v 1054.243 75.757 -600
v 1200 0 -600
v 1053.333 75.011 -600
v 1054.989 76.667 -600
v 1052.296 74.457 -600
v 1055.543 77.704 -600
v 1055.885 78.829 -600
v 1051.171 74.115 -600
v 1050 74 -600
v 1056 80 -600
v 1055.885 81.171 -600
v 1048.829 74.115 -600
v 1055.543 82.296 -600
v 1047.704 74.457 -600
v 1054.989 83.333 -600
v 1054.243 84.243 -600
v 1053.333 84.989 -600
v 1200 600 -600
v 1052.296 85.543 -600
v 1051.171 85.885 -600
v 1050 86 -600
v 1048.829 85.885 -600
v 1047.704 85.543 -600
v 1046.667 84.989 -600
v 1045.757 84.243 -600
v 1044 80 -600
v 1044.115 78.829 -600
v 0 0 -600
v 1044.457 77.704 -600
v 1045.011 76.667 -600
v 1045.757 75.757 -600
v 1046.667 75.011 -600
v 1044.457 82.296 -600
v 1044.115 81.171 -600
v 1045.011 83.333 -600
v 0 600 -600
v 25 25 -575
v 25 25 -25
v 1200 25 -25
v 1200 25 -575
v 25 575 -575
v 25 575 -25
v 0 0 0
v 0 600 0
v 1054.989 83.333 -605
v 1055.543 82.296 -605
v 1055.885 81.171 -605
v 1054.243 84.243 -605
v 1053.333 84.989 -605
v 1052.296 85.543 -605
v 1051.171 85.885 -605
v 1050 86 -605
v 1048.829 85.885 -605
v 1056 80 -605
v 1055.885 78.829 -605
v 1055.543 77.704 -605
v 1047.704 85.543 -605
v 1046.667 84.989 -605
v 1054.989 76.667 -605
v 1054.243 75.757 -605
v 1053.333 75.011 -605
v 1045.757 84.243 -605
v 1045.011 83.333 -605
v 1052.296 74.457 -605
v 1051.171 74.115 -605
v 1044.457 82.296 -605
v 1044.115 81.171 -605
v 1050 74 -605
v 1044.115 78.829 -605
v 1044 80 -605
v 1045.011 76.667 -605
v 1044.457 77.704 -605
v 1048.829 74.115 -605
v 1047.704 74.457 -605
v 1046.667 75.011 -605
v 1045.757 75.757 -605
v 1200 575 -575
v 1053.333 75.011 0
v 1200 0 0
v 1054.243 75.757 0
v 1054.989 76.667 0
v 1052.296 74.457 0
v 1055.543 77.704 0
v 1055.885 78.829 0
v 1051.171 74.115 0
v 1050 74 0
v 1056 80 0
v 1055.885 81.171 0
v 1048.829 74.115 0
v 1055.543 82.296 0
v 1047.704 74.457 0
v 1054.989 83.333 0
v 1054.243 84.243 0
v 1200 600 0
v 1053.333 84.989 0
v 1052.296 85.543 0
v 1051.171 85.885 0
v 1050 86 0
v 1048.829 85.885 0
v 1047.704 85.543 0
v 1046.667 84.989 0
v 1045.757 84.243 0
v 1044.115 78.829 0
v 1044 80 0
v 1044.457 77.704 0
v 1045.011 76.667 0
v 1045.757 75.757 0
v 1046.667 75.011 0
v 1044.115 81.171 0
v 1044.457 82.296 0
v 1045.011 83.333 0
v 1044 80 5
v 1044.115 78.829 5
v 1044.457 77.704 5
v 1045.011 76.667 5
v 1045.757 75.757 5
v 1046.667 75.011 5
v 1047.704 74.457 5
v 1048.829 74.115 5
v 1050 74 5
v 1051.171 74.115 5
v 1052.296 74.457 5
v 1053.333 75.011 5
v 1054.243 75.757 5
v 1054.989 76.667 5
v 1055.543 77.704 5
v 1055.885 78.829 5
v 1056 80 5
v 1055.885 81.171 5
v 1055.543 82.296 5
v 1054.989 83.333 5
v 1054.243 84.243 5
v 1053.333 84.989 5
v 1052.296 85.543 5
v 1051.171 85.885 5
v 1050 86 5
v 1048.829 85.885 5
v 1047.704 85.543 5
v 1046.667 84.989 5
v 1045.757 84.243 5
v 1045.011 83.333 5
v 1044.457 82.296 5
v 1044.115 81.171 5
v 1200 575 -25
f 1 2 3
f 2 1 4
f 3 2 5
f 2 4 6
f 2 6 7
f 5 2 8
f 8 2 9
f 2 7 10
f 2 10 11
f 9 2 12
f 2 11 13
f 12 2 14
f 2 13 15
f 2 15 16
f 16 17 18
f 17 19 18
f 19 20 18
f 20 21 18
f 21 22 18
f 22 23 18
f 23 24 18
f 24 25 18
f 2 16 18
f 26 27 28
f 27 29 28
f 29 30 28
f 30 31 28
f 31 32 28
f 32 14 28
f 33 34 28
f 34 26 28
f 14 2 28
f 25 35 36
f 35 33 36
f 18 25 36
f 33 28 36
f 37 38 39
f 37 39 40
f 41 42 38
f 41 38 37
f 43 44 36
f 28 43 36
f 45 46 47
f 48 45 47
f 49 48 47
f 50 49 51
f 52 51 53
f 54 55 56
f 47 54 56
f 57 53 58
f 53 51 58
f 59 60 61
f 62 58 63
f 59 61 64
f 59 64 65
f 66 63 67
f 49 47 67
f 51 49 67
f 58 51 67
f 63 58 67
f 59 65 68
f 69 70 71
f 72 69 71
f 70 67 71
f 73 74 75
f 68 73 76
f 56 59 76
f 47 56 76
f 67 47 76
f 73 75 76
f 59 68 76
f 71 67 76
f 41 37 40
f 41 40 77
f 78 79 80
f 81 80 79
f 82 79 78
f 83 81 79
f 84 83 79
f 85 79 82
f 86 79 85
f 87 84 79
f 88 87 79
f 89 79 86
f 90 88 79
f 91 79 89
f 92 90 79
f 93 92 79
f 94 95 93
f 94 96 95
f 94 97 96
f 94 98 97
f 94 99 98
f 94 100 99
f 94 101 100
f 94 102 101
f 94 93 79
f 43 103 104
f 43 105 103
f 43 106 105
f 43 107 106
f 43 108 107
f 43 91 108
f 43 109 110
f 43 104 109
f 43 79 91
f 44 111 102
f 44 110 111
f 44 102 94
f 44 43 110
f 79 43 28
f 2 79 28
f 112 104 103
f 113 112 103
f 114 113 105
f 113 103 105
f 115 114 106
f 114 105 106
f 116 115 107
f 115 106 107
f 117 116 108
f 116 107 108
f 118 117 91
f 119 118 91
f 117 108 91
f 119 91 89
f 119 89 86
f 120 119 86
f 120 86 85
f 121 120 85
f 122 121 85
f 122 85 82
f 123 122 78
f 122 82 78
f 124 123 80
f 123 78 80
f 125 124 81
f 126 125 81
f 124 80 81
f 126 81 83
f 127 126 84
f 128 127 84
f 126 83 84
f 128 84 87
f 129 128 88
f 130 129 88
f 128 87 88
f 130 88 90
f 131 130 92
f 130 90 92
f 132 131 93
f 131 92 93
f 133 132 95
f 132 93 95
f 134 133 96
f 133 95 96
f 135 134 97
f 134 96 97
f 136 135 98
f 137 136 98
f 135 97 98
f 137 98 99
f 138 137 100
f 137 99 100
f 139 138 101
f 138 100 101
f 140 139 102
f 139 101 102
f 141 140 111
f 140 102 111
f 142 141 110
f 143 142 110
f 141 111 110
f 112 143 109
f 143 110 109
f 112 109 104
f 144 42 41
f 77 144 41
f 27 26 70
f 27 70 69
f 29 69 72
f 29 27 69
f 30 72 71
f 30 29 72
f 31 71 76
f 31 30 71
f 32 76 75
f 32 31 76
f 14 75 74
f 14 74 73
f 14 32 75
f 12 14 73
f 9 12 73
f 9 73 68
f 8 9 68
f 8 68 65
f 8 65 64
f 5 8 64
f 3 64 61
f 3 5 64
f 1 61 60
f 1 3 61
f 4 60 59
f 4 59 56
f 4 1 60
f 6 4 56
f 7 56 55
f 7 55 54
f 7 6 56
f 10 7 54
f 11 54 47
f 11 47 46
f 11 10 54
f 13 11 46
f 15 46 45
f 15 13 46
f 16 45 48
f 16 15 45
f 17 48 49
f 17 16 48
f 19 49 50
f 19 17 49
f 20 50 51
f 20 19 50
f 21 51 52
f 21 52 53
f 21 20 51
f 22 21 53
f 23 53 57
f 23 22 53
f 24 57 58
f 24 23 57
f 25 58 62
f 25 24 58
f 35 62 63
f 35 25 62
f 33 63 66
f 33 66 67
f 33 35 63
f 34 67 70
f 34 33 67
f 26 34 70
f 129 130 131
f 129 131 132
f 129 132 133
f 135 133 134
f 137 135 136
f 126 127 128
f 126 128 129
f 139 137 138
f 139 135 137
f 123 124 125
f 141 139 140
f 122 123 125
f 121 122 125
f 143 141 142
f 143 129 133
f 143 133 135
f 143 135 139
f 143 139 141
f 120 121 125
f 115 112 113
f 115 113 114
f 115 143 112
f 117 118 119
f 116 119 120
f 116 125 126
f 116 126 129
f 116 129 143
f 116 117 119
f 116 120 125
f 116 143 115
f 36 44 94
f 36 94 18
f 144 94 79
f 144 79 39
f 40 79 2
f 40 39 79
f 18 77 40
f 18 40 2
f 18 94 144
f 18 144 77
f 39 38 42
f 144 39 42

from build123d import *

# Parameters (mm, degrees)
SKETCH1_W           = 600
SKETCH1_H           = 600
BOSS_EXTRUDE1_DEPTH = 1200
SHELL1_T            = -25
SKETCH2_R           = 6
BOSS_EXTRUDE2_DEPTH = 5


with BuildPart() as part:
    # Sketch1 → Boss-Extrude1 (new body)
    with BuildSketch(Plane(origin=(0, 0, 0), x_dir=(0, 0, -1), z_dir=(1, 0, 0))):
        with Locations((300, 300)):
            Rectangle(SKETCH1_W, SKETCH1_H)
    extrude(amount=BOSS_EXTRUDE1_DEPTH)

    # Shell1
    shell1_openings = [part.faces().sort_by_distance(p)[0] for p in [
        (1200, 300, -300),
    ]]
    offset(amount=SHELL1_T, openings=shell1_openings, kind=Kind.INTERSECTION)

    # Sketch2 → Boss-Extrude2 (add)
    with BuildSketch(Plane.XY):
        with Locations(Location((1050, 80, 0), (0, 0, 180))):
            Circle(SKETCH2_R)
    boss_extrude2 = extrude(amount=BOSS_EXTRUDE2_DEPTH)

    # Mirror1: Boss-Extrude2 across plane
    add(boss_extrude2.mirror(Plane.XY.offset(-300)))


solid = part.part
